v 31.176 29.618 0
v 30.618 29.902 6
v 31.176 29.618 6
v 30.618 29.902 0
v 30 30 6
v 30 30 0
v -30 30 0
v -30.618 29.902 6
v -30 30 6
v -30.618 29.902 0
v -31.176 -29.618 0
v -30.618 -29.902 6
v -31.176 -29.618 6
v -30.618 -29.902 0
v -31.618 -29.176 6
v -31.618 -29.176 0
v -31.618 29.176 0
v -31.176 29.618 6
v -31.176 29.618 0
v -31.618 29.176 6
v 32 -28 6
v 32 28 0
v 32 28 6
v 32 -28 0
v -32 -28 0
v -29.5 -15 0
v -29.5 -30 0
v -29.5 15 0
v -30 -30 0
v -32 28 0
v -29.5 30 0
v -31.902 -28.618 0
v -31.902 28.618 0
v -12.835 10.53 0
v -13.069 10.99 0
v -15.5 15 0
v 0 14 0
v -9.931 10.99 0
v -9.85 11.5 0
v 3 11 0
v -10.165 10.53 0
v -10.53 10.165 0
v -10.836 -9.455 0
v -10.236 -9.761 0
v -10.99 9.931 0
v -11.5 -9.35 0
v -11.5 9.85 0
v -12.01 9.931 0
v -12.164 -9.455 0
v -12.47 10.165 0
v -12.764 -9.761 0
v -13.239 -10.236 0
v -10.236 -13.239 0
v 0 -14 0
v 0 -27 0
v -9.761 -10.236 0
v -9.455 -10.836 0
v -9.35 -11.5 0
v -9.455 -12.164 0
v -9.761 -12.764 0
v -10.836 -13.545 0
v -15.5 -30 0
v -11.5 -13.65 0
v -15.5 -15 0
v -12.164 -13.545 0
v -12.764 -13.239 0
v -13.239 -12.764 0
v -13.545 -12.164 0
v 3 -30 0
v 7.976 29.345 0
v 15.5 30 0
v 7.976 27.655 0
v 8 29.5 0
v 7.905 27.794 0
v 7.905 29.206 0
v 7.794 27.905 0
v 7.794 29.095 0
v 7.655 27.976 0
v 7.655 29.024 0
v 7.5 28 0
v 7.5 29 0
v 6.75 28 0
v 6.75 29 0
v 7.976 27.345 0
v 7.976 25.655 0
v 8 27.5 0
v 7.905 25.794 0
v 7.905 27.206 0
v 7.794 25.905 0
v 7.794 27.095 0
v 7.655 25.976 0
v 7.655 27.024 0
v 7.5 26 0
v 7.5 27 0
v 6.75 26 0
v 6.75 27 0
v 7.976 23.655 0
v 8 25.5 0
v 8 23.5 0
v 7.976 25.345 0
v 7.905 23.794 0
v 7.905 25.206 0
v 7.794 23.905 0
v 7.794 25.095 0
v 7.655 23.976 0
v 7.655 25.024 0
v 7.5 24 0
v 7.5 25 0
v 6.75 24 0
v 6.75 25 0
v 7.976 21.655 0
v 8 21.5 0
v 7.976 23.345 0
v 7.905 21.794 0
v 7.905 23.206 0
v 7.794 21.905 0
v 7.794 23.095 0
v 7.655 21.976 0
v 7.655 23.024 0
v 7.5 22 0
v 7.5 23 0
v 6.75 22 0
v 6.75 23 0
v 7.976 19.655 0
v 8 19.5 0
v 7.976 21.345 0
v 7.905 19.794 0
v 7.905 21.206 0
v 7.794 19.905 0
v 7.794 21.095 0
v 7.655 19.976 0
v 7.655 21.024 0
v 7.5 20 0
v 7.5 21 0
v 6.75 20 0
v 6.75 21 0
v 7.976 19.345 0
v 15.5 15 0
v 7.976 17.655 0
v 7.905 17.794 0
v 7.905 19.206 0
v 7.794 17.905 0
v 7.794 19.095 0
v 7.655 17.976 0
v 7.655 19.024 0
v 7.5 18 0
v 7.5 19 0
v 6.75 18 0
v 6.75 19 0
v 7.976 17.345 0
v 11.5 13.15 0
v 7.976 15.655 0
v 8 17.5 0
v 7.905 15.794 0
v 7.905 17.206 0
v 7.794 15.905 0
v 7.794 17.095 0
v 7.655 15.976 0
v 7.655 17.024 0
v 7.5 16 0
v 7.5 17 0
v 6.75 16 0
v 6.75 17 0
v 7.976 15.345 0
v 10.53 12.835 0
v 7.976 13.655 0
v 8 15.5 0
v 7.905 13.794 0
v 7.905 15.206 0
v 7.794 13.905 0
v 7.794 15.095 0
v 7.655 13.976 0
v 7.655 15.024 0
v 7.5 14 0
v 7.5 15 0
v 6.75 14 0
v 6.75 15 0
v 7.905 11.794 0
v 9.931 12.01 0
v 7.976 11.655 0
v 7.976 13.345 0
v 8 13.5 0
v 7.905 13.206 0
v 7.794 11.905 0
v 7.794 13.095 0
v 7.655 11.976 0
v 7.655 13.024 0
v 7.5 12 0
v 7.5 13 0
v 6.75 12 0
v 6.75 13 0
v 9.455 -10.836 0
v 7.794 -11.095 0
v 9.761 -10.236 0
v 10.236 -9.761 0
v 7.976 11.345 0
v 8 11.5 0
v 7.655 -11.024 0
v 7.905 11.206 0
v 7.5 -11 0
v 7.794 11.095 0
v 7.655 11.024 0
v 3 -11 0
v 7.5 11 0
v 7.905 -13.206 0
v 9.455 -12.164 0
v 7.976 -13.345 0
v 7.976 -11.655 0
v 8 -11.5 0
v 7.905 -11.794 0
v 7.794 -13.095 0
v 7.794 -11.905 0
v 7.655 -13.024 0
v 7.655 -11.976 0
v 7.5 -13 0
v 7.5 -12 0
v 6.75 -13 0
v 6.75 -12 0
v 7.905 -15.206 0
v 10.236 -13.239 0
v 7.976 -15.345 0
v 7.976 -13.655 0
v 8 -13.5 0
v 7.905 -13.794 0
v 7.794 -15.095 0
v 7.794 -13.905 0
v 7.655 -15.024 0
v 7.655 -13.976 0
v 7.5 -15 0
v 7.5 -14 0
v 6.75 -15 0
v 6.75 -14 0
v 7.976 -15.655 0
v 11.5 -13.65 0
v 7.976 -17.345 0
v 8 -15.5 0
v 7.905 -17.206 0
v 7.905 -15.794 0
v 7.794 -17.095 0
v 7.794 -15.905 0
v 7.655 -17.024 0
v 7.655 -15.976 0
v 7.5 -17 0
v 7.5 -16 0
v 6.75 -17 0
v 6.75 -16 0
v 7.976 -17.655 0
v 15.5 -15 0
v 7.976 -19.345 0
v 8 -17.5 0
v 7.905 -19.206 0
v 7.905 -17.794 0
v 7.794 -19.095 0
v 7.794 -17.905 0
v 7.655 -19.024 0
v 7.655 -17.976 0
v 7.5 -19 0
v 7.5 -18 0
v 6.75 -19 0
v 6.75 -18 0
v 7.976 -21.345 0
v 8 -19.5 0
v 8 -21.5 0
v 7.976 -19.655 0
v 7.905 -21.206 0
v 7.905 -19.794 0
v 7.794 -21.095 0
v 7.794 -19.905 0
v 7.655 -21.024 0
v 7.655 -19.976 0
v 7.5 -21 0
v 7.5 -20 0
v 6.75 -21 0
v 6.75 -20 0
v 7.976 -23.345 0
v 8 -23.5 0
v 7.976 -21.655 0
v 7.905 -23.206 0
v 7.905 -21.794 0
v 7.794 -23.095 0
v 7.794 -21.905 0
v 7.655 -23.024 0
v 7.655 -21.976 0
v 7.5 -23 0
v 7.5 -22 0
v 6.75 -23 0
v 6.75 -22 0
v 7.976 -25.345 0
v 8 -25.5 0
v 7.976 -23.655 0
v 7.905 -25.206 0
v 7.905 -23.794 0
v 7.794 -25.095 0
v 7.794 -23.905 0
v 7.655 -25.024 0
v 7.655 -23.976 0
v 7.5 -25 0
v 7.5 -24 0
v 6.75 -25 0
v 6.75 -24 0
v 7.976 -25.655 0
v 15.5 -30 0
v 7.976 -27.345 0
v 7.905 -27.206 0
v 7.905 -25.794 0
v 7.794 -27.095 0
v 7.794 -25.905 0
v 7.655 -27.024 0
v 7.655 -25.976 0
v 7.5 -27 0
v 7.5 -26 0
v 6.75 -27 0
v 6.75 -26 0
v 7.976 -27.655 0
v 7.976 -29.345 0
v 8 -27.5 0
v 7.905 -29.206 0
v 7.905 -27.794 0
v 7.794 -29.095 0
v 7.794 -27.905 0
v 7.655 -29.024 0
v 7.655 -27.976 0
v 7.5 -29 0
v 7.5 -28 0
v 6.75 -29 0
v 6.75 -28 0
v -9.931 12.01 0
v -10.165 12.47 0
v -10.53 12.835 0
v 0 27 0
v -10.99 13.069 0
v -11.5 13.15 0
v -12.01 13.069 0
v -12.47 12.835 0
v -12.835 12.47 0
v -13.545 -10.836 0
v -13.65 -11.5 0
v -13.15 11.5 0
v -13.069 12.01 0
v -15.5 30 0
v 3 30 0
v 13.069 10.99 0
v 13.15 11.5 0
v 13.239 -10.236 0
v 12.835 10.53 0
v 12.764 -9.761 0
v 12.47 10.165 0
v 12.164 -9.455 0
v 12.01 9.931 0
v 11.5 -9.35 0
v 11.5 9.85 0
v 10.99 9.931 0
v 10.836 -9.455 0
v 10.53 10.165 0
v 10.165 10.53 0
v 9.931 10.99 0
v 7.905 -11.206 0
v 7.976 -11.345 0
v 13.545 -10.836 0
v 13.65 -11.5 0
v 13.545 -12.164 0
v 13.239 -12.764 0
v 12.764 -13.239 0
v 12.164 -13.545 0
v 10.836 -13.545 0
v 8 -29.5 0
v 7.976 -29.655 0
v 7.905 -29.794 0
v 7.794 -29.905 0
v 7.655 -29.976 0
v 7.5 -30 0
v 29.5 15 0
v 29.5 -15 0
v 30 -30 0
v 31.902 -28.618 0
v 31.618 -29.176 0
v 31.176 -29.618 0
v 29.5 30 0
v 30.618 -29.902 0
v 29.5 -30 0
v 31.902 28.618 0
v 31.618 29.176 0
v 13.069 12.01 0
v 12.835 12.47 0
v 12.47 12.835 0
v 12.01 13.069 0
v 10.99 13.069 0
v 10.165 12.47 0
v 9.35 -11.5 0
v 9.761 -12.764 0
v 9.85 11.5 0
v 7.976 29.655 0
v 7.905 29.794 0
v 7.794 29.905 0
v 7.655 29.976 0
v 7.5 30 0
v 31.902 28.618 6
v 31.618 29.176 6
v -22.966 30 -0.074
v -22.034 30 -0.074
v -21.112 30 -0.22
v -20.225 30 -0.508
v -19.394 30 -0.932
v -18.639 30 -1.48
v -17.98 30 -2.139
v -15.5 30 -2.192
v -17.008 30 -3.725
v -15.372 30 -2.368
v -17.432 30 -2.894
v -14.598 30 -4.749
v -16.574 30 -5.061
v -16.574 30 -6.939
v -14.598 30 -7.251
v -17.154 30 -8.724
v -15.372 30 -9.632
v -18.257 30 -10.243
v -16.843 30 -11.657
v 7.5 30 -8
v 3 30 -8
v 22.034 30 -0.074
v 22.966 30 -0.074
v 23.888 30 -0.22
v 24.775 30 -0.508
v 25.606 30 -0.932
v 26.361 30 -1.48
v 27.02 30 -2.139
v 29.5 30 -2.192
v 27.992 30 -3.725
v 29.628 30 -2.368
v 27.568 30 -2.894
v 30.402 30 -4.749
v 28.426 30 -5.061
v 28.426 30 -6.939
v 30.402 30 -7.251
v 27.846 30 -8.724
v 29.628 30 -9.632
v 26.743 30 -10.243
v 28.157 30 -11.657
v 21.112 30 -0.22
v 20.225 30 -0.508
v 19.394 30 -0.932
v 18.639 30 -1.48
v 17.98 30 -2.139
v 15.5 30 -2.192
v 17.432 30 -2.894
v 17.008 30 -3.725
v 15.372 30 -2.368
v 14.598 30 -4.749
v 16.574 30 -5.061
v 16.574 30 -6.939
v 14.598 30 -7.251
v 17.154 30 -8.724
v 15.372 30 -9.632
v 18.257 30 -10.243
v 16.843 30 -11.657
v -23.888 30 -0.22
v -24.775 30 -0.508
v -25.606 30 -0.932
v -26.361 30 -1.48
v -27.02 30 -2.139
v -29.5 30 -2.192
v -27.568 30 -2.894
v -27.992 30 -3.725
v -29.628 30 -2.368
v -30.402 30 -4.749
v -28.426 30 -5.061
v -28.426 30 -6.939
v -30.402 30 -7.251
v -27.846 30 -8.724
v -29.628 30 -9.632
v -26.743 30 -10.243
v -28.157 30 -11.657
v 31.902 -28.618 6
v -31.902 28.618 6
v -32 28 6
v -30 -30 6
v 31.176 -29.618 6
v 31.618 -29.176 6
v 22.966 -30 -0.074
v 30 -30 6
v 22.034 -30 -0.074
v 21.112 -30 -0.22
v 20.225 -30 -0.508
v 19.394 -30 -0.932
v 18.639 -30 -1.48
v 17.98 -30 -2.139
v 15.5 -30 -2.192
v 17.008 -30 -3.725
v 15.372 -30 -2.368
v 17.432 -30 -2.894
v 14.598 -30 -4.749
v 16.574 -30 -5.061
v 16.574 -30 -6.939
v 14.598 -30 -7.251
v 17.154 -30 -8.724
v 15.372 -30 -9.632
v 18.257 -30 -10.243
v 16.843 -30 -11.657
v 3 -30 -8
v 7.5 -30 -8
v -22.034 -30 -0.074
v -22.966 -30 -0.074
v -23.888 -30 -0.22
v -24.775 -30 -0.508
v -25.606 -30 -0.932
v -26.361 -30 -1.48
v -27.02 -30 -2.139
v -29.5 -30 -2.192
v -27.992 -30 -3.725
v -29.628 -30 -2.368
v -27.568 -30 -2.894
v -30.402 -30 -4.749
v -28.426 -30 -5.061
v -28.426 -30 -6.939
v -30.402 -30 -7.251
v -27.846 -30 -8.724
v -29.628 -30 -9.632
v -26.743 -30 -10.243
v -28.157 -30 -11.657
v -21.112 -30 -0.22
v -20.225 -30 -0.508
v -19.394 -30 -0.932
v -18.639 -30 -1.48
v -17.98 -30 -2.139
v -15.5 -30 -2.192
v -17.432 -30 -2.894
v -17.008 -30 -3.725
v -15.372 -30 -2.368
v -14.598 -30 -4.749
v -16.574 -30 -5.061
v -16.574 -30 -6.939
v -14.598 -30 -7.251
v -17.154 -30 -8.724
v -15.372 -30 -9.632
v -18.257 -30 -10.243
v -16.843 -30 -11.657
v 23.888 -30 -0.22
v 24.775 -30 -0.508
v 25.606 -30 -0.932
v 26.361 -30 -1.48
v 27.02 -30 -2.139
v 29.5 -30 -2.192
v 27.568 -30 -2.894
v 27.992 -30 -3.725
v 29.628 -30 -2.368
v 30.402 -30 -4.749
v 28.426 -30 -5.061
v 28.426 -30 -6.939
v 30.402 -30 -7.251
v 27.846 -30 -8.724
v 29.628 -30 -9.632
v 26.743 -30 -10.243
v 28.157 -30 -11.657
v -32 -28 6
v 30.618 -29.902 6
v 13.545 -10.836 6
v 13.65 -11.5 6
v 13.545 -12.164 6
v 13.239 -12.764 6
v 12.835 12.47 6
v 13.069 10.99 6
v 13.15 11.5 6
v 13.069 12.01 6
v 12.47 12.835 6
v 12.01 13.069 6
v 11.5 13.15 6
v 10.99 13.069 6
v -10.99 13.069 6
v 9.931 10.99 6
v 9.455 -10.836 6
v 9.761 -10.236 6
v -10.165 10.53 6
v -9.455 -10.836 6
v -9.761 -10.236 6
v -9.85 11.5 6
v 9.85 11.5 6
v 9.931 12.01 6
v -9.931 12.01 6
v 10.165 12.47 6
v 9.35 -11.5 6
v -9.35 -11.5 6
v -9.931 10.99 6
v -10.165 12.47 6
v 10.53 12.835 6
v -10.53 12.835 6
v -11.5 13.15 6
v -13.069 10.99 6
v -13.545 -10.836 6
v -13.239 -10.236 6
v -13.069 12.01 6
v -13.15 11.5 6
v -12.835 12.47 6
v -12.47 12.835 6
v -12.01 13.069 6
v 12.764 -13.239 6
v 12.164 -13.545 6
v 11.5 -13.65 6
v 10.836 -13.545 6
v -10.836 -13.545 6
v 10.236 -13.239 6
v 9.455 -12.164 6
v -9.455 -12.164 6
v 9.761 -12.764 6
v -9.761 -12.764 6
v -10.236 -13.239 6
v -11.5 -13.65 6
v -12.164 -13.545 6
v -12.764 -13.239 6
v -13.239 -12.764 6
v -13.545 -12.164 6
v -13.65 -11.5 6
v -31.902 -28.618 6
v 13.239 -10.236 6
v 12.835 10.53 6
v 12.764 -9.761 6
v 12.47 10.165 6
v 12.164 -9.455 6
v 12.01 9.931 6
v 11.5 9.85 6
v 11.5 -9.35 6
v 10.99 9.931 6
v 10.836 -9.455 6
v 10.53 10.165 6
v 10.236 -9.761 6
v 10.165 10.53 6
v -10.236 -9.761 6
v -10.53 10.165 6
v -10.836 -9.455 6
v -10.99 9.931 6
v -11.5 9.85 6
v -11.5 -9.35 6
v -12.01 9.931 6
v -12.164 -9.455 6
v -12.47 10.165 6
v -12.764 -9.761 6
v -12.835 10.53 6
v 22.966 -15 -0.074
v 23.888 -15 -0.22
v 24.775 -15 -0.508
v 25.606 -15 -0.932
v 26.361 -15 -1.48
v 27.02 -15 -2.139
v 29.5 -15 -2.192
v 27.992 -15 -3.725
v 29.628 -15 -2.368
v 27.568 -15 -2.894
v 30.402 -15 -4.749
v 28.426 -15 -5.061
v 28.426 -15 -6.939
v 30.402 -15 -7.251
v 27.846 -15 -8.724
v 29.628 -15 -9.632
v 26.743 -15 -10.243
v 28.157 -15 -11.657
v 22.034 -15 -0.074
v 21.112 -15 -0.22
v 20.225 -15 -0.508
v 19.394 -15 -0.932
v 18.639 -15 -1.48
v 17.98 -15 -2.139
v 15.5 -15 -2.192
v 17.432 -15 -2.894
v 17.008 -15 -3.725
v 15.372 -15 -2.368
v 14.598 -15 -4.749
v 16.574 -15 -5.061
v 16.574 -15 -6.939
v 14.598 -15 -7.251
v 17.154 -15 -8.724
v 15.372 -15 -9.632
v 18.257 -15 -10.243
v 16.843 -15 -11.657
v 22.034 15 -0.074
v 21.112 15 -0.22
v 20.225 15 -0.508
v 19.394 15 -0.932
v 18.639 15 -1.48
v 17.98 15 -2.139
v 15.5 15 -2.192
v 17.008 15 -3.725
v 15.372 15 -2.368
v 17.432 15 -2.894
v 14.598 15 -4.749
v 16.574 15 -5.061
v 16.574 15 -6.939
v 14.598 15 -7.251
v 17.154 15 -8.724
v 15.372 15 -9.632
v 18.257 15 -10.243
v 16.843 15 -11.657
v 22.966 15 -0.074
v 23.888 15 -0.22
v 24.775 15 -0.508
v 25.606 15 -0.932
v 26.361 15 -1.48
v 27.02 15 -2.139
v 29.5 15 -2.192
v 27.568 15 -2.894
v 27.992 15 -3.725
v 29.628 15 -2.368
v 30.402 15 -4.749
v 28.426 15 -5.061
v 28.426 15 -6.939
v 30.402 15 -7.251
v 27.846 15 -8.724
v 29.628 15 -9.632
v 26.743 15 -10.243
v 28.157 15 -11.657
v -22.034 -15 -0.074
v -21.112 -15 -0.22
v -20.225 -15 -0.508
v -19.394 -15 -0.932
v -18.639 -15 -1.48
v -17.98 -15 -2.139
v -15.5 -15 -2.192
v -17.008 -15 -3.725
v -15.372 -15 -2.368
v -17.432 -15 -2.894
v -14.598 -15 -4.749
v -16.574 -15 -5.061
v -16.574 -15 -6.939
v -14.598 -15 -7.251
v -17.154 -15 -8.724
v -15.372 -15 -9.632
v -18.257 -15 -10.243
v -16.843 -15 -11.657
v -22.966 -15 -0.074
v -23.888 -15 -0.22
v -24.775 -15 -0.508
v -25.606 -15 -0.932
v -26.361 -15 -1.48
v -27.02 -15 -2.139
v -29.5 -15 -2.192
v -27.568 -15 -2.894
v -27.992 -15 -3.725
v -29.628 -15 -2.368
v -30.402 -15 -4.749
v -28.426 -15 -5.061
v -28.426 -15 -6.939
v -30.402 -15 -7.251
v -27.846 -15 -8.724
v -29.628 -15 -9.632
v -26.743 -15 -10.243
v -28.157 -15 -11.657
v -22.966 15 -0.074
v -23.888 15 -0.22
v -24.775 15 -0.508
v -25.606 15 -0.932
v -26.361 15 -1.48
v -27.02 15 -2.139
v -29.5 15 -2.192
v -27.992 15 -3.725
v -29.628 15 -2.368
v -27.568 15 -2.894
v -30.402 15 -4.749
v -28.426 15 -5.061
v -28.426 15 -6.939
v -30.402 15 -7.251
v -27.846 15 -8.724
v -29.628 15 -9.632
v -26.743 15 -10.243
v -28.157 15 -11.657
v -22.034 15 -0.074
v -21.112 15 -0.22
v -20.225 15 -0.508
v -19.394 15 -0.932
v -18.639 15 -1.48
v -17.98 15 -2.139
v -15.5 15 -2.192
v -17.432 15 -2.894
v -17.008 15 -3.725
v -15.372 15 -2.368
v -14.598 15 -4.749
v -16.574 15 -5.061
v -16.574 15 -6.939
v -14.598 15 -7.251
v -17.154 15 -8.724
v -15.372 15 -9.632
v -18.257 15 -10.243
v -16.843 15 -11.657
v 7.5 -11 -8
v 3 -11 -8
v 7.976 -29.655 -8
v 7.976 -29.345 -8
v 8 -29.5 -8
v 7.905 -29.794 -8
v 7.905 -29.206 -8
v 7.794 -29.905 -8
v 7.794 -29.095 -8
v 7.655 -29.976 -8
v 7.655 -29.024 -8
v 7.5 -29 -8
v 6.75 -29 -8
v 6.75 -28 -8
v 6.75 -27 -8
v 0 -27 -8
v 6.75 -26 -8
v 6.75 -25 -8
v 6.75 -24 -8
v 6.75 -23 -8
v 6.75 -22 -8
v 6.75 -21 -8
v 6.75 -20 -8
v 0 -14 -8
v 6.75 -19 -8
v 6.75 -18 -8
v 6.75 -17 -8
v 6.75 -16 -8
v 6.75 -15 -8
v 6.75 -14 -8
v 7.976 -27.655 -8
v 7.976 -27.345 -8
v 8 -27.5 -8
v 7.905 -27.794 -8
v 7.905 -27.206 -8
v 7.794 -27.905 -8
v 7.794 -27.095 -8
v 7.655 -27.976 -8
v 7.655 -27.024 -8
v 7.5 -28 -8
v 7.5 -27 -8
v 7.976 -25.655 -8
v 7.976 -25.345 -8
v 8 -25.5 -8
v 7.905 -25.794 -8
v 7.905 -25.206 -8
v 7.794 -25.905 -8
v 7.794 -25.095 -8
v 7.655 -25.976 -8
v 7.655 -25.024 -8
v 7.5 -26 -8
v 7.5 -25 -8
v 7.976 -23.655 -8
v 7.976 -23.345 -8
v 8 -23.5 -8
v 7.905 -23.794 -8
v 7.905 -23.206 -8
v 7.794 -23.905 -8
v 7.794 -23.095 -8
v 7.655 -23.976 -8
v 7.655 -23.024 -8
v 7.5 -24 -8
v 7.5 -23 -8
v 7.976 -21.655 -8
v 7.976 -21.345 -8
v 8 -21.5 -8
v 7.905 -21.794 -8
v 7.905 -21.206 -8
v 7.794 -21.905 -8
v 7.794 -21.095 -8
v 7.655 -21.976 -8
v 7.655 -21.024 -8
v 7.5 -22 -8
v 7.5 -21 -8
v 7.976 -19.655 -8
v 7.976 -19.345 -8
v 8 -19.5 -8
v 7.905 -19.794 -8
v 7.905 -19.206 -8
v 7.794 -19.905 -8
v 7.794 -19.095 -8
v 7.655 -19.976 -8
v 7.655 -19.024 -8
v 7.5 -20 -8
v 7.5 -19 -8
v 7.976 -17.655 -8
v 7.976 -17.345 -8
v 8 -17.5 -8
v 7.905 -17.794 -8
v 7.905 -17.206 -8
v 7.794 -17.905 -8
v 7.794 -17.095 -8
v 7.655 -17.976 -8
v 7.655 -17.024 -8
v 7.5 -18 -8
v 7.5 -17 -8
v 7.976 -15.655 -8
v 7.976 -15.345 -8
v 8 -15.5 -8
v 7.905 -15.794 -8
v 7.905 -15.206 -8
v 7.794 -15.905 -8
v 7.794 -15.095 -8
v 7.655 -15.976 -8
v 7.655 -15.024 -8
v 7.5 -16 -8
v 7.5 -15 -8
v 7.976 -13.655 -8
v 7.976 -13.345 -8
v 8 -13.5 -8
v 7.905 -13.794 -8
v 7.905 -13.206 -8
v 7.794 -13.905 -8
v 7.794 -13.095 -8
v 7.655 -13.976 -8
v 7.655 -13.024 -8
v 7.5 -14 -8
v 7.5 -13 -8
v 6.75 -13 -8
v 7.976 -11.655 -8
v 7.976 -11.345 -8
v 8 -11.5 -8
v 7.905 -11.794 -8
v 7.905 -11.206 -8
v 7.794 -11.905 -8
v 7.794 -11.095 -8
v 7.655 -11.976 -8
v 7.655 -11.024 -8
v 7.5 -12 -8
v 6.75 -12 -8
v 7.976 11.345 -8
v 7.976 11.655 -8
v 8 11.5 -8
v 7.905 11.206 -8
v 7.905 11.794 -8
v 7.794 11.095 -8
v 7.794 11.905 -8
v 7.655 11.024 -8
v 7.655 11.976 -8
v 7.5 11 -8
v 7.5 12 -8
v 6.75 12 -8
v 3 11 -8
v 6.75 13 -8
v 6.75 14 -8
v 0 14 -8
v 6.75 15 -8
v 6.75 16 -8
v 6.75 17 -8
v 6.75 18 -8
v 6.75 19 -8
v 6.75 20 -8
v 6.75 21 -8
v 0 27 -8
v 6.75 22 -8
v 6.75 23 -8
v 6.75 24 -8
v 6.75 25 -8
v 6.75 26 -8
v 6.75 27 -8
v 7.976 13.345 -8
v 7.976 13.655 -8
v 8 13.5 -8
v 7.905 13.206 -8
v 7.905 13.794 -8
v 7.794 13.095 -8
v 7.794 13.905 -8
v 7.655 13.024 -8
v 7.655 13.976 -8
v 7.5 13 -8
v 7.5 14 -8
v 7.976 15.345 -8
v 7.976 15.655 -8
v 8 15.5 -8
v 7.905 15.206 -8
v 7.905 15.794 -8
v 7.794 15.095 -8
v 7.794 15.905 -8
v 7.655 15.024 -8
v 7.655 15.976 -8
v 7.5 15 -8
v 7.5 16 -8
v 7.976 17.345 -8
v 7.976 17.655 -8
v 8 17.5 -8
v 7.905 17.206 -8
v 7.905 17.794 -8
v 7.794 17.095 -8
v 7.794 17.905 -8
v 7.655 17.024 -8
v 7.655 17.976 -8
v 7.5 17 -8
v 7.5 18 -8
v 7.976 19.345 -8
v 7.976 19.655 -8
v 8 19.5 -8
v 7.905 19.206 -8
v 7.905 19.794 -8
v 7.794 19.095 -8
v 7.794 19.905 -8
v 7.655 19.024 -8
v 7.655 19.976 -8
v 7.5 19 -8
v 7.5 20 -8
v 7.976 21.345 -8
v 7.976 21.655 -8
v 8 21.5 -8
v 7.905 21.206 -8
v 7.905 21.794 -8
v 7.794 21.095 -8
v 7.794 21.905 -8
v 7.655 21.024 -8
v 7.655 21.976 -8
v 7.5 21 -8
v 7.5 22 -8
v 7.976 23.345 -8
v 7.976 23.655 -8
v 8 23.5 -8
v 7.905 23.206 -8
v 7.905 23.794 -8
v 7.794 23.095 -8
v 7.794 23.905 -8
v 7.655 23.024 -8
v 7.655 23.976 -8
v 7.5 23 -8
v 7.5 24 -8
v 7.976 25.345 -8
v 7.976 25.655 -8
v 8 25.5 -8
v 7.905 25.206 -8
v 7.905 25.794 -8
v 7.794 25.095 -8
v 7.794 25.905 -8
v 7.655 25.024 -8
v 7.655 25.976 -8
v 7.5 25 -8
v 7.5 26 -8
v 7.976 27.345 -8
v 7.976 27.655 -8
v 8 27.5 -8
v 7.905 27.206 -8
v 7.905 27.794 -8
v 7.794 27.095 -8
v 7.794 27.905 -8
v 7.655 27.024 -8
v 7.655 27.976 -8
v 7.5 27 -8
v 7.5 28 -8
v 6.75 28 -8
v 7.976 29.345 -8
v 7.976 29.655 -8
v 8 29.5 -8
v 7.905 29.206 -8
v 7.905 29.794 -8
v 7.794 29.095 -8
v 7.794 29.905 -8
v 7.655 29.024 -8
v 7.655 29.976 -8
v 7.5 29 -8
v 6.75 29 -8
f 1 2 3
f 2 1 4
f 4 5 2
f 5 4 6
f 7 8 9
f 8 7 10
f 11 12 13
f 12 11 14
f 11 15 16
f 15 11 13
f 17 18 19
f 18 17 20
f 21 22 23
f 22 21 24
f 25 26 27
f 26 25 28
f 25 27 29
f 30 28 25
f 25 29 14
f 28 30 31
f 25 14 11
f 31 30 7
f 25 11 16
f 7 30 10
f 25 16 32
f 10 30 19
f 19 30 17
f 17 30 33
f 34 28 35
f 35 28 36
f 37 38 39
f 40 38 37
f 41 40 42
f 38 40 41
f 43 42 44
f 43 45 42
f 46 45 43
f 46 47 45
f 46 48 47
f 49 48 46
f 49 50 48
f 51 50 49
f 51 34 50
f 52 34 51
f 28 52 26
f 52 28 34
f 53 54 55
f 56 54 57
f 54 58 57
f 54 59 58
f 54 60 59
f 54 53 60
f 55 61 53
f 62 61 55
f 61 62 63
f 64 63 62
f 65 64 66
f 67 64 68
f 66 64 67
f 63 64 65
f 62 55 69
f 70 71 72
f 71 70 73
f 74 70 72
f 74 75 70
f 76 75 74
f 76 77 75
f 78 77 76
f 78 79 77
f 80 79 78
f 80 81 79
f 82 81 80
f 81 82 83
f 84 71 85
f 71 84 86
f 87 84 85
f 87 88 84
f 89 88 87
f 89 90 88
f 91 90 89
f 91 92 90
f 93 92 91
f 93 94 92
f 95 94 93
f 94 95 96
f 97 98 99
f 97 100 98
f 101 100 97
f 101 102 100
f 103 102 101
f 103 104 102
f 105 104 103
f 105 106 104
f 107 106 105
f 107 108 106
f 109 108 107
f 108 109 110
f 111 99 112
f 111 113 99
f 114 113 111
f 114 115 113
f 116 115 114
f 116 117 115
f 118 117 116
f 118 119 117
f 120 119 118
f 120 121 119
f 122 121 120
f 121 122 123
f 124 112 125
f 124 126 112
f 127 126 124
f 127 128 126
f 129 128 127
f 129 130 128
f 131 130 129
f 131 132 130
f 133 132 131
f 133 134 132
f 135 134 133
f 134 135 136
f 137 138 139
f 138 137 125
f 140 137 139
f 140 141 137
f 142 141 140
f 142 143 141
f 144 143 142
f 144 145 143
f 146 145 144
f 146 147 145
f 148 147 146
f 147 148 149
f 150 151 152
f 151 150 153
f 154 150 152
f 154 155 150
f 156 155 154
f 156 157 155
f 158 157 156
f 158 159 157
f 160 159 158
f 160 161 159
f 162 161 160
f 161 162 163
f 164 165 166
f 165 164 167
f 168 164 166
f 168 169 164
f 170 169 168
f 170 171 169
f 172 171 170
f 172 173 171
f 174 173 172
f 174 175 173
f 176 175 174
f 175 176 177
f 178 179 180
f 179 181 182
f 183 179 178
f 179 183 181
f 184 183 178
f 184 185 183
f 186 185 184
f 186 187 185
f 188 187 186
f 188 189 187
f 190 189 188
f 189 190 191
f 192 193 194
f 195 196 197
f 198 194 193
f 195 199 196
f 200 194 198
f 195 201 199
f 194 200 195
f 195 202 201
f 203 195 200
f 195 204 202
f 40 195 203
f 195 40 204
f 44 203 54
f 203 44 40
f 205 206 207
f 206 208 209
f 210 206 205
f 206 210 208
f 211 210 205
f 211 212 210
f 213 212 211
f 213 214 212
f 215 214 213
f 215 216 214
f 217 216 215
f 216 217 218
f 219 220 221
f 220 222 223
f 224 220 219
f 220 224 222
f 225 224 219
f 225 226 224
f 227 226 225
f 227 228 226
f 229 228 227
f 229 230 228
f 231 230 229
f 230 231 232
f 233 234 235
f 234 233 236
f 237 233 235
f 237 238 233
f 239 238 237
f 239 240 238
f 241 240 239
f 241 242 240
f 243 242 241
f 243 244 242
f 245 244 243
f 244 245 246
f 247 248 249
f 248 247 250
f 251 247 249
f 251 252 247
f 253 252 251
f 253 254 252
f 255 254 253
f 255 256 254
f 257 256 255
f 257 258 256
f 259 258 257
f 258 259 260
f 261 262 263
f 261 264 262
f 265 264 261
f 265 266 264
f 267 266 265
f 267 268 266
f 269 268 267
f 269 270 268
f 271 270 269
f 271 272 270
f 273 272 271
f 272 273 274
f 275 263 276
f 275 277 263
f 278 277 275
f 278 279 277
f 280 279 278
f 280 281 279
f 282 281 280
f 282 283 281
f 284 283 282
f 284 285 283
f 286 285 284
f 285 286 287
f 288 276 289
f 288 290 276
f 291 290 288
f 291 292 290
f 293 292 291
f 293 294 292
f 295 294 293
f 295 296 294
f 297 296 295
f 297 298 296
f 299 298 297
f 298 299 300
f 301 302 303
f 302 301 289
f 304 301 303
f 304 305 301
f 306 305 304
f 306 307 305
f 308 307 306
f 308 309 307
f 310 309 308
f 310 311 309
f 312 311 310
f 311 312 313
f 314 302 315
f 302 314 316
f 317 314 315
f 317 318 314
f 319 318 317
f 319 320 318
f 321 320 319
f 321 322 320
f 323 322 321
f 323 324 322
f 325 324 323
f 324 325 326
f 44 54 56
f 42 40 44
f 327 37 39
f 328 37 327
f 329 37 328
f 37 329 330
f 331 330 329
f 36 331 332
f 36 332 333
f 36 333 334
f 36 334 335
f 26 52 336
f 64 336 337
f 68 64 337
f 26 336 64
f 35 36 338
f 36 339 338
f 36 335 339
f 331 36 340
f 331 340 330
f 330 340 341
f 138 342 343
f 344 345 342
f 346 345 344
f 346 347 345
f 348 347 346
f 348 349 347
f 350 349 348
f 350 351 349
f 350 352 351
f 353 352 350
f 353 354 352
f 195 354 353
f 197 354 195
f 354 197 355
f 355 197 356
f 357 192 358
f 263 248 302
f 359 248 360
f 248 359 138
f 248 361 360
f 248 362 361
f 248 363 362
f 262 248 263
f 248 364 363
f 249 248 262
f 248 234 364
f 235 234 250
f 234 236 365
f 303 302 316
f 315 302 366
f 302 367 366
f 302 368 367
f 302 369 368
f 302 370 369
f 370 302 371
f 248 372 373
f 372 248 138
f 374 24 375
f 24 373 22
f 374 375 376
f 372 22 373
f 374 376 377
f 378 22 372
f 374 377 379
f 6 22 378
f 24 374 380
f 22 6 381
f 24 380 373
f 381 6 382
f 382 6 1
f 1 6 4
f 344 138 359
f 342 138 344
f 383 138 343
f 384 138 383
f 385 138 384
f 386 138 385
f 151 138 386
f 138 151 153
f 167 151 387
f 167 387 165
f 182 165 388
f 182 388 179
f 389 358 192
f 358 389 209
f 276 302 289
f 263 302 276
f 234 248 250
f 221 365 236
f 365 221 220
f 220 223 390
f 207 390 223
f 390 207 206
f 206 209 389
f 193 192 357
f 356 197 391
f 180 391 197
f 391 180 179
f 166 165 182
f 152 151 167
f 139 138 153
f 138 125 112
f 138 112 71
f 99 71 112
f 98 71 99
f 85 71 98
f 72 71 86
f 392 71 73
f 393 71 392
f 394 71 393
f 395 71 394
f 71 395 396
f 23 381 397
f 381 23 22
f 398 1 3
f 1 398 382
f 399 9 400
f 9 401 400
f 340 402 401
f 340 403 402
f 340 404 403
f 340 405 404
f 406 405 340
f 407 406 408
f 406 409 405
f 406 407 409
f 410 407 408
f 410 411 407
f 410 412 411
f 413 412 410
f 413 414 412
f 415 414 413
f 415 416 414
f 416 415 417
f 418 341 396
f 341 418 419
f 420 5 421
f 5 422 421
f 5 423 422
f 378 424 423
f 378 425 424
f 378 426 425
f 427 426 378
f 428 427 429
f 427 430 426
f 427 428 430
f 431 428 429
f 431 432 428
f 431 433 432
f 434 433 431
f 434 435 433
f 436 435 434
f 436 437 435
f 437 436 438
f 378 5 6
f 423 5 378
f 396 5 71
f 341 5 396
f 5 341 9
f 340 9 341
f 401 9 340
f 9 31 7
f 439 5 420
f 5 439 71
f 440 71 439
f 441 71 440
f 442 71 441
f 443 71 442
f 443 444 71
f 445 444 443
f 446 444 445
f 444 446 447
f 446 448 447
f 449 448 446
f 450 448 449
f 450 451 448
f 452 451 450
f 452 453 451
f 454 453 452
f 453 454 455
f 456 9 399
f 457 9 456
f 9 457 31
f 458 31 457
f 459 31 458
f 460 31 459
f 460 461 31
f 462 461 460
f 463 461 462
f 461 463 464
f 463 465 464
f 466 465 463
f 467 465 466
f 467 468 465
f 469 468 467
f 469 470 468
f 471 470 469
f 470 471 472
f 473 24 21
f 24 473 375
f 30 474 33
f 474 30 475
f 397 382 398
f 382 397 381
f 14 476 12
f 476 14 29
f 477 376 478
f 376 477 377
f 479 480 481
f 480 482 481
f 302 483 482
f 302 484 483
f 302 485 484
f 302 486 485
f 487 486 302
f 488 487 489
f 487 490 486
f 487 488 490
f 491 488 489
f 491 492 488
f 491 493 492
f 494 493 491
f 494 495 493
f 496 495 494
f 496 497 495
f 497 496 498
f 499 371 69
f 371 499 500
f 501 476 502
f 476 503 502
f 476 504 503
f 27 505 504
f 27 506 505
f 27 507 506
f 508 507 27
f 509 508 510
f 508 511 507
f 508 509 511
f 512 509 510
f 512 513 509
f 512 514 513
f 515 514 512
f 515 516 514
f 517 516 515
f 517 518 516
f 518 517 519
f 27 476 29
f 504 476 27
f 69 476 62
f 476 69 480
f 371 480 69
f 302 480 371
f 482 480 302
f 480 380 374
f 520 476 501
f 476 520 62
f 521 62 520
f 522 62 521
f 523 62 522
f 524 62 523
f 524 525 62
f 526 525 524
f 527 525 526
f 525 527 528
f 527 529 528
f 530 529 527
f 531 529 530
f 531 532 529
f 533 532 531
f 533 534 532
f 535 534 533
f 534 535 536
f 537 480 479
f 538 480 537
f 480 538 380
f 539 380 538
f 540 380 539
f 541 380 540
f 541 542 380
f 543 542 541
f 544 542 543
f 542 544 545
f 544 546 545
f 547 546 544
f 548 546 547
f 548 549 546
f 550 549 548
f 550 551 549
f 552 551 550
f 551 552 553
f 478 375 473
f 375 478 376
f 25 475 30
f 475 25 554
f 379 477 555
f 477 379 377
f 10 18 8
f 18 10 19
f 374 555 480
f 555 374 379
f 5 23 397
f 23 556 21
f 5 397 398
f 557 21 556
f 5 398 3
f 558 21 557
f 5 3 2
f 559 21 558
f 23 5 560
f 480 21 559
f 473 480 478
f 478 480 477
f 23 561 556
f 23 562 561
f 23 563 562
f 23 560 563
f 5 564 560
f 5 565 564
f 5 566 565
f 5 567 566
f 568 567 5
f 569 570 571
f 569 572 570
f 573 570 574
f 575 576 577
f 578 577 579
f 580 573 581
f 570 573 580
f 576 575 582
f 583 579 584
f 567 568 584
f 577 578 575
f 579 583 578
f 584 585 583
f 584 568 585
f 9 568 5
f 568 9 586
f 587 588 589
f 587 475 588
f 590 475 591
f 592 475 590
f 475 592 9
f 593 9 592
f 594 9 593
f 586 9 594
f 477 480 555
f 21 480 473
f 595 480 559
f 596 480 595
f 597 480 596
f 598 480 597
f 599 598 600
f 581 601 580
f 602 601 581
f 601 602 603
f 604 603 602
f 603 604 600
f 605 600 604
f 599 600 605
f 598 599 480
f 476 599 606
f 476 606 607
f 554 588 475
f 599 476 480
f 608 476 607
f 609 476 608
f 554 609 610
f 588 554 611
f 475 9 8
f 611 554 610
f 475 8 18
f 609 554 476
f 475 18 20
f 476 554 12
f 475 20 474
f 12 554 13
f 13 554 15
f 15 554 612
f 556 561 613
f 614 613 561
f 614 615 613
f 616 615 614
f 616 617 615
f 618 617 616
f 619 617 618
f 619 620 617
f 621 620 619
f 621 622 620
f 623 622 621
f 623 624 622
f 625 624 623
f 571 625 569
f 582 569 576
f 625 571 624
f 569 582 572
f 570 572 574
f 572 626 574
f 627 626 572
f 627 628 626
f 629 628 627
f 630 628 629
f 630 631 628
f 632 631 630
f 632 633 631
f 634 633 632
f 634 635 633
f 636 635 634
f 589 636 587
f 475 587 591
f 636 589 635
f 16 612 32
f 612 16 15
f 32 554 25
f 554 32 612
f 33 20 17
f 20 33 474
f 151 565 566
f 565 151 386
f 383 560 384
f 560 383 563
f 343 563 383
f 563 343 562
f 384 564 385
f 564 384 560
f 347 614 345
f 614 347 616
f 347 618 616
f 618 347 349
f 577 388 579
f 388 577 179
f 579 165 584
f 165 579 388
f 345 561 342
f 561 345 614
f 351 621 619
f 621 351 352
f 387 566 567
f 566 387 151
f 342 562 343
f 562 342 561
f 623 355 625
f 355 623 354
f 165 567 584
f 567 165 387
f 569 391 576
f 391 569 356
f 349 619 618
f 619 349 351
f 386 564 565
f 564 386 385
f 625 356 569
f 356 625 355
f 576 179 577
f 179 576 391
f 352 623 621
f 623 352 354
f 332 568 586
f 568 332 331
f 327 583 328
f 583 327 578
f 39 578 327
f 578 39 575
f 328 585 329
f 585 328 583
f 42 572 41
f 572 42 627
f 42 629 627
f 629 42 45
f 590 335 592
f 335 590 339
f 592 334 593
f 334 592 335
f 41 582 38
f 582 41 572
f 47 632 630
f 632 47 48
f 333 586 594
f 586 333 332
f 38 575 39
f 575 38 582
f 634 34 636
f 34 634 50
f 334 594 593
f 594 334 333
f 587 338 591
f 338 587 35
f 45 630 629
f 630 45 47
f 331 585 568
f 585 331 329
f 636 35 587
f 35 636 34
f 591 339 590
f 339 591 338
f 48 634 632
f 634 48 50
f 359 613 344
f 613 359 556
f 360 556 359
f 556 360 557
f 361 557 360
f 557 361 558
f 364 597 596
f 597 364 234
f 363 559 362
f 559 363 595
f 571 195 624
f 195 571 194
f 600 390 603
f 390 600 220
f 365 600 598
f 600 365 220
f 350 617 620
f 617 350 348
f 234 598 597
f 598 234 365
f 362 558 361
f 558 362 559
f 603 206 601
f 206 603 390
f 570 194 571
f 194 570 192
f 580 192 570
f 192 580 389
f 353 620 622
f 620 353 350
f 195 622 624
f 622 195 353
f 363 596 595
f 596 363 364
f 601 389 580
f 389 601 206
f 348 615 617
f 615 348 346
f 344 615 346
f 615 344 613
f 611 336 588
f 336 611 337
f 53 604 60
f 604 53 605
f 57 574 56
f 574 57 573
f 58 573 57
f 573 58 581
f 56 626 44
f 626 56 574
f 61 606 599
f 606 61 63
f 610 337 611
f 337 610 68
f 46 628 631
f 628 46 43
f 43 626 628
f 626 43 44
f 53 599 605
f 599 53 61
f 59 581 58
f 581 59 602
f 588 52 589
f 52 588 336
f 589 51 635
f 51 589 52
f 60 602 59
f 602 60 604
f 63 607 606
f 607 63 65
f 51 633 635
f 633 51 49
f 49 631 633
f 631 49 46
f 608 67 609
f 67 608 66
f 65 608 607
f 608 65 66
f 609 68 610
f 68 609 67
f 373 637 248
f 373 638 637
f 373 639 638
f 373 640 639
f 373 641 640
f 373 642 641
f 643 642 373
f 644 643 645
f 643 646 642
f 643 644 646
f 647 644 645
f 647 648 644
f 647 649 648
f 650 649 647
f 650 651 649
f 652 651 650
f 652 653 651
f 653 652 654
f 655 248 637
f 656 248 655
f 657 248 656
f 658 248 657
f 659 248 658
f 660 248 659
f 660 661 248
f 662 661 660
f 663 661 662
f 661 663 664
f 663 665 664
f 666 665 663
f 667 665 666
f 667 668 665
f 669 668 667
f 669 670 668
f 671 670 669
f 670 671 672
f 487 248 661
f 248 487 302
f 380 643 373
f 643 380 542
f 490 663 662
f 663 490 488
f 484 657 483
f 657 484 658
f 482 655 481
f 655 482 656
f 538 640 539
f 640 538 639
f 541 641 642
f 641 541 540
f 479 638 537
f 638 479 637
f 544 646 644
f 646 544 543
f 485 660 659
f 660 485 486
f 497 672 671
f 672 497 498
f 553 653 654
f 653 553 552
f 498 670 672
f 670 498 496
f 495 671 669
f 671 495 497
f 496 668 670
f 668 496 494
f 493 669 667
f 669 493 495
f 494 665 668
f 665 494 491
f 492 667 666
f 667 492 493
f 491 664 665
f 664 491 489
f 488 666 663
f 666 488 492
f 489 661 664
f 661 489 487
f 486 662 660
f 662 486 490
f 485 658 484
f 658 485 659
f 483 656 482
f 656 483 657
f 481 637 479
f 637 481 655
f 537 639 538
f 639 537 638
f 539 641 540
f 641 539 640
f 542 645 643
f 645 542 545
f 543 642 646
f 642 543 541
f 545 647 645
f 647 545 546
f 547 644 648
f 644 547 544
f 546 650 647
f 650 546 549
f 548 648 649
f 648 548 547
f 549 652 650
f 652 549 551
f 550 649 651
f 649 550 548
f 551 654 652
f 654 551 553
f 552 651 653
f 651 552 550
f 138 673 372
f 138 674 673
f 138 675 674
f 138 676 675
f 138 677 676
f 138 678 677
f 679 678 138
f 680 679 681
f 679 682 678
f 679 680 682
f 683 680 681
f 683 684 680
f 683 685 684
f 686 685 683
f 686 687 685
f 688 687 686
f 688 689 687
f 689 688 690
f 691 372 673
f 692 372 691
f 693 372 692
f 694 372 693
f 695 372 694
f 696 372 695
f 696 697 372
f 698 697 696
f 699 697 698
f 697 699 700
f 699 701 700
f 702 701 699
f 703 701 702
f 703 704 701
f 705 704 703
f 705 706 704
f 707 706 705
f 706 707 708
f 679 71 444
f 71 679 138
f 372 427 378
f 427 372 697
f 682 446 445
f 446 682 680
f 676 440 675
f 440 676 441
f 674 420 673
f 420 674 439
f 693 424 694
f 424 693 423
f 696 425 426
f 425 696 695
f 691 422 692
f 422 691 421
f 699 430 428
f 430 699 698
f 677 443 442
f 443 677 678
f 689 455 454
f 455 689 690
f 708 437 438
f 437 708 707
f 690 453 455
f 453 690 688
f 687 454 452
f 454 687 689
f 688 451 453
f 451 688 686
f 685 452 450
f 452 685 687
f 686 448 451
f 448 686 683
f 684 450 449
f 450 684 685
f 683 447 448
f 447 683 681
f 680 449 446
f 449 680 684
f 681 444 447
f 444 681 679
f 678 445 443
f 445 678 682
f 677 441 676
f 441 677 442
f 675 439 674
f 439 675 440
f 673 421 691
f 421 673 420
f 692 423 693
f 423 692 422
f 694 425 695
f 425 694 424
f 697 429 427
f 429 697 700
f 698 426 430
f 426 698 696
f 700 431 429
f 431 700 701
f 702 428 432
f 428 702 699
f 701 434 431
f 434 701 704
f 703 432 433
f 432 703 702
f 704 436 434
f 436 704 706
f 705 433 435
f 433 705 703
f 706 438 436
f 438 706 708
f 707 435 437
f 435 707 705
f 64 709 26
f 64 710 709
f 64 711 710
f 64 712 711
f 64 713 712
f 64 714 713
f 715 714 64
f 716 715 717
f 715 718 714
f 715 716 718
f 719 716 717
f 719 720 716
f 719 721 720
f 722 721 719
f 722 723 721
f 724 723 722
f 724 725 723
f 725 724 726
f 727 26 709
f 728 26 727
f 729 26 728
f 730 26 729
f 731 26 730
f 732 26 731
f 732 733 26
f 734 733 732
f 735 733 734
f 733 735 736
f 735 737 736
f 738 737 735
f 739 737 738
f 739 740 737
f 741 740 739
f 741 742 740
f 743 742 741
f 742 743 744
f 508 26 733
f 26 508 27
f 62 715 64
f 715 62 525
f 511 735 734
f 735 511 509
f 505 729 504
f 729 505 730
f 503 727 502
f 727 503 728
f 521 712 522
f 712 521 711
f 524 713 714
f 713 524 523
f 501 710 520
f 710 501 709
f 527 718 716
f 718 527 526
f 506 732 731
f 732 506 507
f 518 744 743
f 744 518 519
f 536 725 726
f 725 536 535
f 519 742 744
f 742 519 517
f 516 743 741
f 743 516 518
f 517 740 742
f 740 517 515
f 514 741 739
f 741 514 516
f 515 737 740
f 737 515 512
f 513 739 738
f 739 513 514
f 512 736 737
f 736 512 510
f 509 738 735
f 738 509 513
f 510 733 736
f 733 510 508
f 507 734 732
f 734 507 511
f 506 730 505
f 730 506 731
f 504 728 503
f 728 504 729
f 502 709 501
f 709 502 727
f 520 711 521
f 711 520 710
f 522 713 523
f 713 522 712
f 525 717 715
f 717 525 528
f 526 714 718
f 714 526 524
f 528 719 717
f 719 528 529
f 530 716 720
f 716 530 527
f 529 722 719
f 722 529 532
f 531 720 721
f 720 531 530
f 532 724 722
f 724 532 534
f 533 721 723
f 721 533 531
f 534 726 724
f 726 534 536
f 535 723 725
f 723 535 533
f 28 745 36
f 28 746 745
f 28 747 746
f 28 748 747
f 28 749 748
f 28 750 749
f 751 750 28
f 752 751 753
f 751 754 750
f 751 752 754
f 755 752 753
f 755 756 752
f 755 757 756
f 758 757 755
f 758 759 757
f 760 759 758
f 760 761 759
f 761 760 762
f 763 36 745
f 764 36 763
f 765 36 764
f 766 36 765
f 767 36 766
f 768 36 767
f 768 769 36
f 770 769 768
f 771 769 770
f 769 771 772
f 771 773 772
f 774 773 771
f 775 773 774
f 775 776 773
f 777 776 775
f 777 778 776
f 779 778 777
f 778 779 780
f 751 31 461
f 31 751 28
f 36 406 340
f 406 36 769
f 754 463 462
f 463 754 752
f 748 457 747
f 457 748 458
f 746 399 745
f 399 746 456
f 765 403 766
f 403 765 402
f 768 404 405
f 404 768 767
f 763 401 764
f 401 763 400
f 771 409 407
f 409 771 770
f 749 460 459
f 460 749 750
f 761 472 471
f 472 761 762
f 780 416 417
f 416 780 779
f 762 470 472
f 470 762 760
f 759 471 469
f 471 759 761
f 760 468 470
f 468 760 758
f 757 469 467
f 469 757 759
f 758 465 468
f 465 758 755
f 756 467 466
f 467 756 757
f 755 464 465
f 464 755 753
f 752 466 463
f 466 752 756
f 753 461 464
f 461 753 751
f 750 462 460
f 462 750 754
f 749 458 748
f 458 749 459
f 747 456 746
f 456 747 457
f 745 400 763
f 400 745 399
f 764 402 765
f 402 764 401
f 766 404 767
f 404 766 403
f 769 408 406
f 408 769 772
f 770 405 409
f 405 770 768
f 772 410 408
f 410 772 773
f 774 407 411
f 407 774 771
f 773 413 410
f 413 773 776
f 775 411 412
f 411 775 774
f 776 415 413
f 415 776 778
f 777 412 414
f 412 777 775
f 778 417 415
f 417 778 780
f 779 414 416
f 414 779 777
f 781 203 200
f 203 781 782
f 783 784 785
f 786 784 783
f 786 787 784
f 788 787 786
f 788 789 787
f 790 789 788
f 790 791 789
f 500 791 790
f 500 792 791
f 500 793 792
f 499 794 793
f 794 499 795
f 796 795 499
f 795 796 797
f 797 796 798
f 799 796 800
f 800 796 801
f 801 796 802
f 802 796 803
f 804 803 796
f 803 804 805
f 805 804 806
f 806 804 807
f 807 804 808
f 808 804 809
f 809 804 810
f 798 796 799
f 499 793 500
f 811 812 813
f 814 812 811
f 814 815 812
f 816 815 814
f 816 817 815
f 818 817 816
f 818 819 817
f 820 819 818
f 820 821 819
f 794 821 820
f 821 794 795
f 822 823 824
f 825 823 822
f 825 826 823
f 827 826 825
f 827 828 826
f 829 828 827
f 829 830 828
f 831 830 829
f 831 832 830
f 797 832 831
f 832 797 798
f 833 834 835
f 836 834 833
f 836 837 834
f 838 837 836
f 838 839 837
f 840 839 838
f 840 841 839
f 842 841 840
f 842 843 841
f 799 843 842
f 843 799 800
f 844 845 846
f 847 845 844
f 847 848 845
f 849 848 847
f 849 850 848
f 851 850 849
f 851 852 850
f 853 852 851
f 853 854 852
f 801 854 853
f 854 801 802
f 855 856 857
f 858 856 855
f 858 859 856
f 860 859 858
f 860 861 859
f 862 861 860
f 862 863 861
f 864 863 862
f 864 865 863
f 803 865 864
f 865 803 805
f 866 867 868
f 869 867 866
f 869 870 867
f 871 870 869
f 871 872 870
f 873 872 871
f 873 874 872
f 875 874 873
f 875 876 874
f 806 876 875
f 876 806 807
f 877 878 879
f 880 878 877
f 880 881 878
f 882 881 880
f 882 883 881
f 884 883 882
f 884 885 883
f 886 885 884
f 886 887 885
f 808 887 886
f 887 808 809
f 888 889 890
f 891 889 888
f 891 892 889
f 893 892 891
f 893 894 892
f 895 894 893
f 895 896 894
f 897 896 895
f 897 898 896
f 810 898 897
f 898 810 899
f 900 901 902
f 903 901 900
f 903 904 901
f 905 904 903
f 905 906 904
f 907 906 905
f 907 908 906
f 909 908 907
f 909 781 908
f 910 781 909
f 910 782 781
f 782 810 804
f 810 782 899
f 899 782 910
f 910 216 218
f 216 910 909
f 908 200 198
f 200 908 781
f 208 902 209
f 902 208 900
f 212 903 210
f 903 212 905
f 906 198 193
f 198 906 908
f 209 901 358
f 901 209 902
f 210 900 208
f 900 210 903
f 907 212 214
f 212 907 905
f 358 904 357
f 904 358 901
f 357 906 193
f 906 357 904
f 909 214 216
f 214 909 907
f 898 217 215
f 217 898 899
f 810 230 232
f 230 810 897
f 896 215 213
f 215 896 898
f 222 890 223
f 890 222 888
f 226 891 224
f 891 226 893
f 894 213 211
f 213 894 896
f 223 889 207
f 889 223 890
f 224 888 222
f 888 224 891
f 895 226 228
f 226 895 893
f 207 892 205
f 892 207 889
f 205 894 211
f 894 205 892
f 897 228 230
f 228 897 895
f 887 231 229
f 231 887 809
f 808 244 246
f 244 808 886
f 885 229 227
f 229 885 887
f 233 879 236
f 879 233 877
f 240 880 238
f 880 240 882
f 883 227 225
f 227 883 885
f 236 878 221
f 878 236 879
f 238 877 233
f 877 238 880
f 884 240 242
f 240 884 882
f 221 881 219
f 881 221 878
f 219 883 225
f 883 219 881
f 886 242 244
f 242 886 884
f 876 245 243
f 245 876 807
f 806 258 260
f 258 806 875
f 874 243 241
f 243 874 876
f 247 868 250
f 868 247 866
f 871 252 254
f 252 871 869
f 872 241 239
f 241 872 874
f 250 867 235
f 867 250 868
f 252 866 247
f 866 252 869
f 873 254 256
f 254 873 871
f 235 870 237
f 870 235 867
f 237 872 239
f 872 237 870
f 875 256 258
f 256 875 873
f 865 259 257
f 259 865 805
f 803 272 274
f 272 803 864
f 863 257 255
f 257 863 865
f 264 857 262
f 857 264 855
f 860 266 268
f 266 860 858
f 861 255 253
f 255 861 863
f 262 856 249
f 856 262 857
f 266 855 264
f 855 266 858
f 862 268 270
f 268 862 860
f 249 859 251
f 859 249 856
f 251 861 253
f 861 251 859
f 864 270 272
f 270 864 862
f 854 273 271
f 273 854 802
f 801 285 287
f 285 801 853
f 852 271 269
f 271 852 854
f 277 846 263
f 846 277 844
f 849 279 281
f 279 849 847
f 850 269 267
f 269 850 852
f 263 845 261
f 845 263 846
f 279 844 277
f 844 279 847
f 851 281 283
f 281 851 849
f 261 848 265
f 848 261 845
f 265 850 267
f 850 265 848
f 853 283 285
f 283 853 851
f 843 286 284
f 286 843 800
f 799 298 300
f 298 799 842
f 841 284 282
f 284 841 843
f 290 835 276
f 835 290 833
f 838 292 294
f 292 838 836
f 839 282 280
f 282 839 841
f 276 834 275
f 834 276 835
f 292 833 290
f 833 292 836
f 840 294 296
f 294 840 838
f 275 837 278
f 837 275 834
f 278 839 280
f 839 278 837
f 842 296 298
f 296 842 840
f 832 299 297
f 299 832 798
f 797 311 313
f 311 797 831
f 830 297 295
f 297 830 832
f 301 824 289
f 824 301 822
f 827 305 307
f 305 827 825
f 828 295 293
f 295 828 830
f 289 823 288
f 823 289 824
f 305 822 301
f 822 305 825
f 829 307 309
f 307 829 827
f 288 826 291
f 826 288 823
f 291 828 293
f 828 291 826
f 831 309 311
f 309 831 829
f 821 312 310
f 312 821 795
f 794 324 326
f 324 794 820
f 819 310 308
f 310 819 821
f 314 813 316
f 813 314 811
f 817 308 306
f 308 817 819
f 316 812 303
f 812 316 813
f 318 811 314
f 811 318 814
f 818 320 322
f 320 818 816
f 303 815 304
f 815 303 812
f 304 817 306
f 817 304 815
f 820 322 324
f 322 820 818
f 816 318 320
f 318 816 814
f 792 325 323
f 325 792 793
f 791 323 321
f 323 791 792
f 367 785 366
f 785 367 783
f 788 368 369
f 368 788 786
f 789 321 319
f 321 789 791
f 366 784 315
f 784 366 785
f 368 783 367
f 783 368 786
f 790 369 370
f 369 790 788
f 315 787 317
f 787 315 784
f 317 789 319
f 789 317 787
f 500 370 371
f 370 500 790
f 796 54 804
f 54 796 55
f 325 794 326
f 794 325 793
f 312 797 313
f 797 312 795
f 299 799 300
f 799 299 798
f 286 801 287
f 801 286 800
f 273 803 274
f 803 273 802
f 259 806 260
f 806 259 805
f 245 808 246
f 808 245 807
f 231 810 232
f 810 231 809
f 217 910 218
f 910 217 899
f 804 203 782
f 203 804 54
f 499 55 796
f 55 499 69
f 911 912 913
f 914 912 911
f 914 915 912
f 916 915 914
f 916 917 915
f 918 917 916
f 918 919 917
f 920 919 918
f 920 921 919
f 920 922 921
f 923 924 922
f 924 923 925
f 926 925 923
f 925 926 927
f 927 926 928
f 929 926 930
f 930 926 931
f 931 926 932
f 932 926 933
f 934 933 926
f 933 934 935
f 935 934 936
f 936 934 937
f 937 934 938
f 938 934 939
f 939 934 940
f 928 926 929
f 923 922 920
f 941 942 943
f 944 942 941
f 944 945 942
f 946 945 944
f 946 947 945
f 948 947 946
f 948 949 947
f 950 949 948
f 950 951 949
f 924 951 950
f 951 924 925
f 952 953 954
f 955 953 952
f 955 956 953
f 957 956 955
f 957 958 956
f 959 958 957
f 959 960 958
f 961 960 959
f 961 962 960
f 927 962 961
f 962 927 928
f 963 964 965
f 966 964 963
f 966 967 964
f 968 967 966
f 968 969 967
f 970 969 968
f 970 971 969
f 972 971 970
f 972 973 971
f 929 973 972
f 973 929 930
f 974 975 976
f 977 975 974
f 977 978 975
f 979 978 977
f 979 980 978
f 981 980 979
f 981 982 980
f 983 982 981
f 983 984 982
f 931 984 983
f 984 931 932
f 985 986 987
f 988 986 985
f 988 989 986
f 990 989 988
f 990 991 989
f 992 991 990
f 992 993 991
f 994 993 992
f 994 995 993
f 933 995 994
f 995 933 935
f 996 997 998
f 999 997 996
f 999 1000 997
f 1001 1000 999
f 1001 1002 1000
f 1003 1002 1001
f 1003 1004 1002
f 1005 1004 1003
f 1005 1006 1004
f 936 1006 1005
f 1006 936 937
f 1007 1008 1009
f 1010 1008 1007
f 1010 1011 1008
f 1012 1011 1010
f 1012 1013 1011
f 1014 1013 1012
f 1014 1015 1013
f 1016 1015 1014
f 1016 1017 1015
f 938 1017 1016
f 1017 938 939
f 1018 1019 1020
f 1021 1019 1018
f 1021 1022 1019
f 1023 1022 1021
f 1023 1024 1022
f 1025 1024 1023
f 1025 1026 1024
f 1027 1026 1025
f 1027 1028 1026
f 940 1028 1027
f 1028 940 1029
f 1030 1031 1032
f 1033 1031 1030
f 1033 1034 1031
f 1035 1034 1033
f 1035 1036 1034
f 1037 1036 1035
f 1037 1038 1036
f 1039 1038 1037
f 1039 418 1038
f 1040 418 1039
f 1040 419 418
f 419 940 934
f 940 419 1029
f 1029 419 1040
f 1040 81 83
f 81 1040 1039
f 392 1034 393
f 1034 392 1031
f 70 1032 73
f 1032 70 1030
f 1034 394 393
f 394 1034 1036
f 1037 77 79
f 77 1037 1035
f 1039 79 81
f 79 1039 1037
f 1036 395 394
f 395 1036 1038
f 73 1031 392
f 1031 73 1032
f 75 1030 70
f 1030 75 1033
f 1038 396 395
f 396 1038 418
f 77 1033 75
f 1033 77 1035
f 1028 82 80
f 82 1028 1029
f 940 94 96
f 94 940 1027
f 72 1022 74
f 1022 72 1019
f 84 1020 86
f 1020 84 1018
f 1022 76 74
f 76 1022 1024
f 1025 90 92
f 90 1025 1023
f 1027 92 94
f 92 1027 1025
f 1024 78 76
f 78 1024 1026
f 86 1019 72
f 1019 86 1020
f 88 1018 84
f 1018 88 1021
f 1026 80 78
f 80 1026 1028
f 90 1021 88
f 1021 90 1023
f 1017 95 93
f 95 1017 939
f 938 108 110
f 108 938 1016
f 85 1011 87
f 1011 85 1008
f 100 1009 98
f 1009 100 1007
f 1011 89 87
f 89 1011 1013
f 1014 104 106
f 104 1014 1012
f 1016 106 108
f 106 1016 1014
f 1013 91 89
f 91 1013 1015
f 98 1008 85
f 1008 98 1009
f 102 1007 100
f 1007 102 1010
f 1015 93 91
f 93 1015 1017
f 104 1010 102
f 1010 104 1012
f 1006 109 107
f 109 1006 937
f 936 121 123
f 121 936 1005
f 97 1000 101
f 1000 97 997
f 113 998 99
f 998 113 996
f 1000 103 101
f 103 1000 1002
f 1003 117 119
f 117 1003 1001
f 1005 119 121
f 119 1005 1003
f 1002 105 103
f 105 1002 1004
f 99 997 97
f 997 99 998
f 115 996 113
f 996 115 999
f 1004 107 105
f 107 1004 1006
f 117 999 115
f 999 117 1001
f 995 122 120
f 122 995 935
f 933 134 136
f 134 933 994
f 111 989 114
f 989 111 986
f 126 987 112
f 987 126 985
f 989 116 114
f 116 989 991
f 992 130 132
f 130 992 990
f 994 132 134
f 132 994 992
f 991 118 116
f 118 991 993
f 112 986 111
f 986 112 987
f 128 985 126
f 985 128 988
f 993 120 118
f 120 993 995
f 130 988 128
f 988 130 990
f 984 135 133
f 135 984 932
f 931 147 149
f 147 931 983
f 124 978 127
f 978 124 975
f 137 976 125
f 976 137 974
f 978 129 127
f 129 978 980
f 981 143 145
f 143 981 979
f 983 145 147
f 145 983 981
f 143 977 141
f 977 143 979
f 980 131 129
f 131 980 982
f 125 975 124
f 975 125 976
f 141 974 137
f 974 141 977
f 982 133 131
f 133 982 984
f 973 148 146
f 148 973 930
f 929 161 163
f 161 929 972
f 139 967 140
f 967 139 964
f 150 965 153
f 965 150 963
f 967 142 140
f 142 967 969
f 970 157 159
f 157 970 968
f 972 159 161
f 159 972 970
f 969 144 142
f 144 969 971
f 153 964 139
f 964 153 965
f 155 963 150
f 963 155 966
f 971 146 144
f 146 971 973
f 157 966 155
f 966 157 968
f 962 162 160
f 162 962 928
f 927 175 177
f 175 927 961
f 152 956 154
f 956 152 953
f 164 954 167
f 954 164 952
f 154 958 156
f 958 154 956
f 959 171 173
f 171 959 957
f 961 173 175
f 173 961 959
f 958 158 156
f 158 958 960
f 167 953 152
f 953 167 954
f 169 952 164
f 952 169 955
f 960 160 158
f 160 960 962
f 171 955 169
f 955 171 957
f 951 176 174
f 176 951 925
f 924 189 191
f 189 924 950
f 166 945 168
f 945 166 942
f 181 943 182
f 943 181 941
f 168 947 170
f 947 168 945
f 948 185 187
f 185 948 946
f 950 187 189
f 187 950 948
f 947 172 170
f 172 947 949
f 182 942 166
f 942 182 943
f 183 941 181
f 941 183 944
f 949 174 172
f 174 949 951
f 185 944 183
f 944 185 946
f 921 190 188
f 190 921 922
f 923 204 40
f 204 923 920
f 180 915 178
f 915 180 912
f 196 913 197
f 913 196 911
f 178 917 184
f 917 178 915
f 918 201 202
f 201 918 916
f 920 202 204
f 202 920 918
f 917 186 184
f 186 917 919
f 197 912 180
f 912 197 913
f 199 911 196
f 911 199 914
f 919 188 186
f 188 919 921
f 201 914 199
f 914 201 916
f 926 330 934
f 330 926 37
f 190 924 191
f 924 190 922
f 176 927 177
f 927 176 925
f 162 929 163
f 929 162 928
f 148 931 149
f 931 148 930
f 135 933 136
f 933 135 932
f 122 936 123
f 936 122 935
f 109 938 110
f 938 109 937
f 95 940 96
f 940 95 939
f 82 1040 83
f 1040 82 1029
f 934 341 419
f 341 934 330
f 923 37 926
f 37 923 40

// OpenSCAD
$fn=20;

//Maße Grundplatte
//gr_x=75;
gr_x=60;
gr_y=56;
gr_z=5;

//Schrauben links
d_m3=3.3; //Durchmesser
h_m3=15;

//Schrauben rechts
d_m4=4.3;
h_m4=15;

//Schraubenabstand
s_horizontal=11.5;
s_vertikal=11.5;

//Klammer
wandstaerke=2;
d_bushing=12;
h_bushing=15;

//Achsenabstand (radius zu radius)
d_axis=45;

//GT2 Holder
p_tweak1_x=-11;
p_tweak1_y=-8;
p_tweak1_z=-8;

p_tweak2_x=+30;
p_tweak2_y=-8;
p_tweak2_z=-8;

module clamp(wandstaerke,d_bushing,h_bushing) {
    
    rotate([0,90,90]){
        //Klammer
        rotate([0,0,45]){
        rotate_extrude(angle = 270){
            translate([6, 0, 0])
            square([wandstaerke,h_bushing]);
        }
        }

        //Klammerplatte
        difference(){
            translate([-(d_bushing)/2+wandstaerke/2,0,h_bushing/2]){
                cube([d_bushing/2,d_bushing+wandstaerke,h_bushing], center=true);
            }
            
            cylinder(d1=d_bushing,d2=d_bushing,h=h_bushing);
        }
    }

}


//GT2 Holder
module gt2_holder(position_tweak_x,position_tweak_y,position_tweak_z){
    rotate([0,0,90]){
        difference(){
            union(){
                for ( i = [0 : 9] ){
                        translate([0-i*2+position_tweak_x-1,position_tweak_y+0.5,position_tweak_z]) cube([1,7,8]);
                        translate([0-i*2+position_tweak_x-0.5,position_tweak_y+0.5,position_tweak_z]) cylinder(d1=1,d2=1,h=8);
                     }
                     
                translate([-19+position_tweak_x,0.75+0.5+position_tweak_y,position_tweak_z]){
                    cube ([19,6.75,8]);
                }
            
        }
            //Anfasung
            translate([0+position_tweak_x,5+position_tweak_y,+position_tweak_z]){
             rotate([0,0,45]){
                cube([10,10,15]);
             }
        }
            //Anfasung
            translate([-19+position_tweak_x,5+position_tweak_y,+position_tweak_z]){
             rotate([0,0,45]){
                cube([10,10,15]);
             }
        }
    }

    }
}

difference(){
    
    //Grundplatte
    translate([0,0,gr_z/2]){
        minkowski(){
         cube([gr_x,gr_y,gr_z], center=true);
         cylinder(r=2,h=1);
        }
    }
    
    //Schraubenlöcher recht
    translate([s_horizontal,s_vertikal,0]){
        cylinder(d1=d_m3, d2=d_m3, h=h_m3);
    }
    
    translate([-s_horizontal,s_vertikal,0]){
        cylinder(d1=d_m3, d2=d_m3, h=h_m3);
    }
    
    //Scraubenlöcher links
    translate([s_horizontal,-s_vertikal,0]){
        cylinder(d1=d_m4, d2=d_m4, h=h_m4);
    }
    
    translate([-s_horizontal,-s_vertikal,0]){
        cylinder(d1=d_m4, d2=d_m4, h=h_m4);
    }

}

//Klammern

translate([d_axis/2,-gr_y/2-2,-wandstaerke/2-gr_z]){
//translate(d_axis/2,0,0){
    clamp(wandstaerke,d_bushing,h_bushing);
}

translate([d_axis/2,gr_y/2-h_bushing+2,-wandstaerke/2-gr_z]){
//translate(d_axis/2,0,0){
    clamp(wandstaerke,d_bushing,h_bushing);
}

translate([-d_axis/2,-gr_y/2-2,-wandstaerke/2-gr_z]){
//translate(d_axis/2,0,0){
    clamp(wandstaerke,d_bushing,h_bushing);
}

translate([-d_axis/2,gr_y/2-h_bushing+2,-wandstaerke/2-gr_z]){
//translate(d_axis/2,0,0){
    clamp(wandstaerke,d_bushing,h_bushing);
}

gt2_holder(p_tweak1_x,p_tweak1_y,p_tweak1_z);
gt2_holder(p_tweak2_x,p_tweak2_y,p_tweak2_z);
